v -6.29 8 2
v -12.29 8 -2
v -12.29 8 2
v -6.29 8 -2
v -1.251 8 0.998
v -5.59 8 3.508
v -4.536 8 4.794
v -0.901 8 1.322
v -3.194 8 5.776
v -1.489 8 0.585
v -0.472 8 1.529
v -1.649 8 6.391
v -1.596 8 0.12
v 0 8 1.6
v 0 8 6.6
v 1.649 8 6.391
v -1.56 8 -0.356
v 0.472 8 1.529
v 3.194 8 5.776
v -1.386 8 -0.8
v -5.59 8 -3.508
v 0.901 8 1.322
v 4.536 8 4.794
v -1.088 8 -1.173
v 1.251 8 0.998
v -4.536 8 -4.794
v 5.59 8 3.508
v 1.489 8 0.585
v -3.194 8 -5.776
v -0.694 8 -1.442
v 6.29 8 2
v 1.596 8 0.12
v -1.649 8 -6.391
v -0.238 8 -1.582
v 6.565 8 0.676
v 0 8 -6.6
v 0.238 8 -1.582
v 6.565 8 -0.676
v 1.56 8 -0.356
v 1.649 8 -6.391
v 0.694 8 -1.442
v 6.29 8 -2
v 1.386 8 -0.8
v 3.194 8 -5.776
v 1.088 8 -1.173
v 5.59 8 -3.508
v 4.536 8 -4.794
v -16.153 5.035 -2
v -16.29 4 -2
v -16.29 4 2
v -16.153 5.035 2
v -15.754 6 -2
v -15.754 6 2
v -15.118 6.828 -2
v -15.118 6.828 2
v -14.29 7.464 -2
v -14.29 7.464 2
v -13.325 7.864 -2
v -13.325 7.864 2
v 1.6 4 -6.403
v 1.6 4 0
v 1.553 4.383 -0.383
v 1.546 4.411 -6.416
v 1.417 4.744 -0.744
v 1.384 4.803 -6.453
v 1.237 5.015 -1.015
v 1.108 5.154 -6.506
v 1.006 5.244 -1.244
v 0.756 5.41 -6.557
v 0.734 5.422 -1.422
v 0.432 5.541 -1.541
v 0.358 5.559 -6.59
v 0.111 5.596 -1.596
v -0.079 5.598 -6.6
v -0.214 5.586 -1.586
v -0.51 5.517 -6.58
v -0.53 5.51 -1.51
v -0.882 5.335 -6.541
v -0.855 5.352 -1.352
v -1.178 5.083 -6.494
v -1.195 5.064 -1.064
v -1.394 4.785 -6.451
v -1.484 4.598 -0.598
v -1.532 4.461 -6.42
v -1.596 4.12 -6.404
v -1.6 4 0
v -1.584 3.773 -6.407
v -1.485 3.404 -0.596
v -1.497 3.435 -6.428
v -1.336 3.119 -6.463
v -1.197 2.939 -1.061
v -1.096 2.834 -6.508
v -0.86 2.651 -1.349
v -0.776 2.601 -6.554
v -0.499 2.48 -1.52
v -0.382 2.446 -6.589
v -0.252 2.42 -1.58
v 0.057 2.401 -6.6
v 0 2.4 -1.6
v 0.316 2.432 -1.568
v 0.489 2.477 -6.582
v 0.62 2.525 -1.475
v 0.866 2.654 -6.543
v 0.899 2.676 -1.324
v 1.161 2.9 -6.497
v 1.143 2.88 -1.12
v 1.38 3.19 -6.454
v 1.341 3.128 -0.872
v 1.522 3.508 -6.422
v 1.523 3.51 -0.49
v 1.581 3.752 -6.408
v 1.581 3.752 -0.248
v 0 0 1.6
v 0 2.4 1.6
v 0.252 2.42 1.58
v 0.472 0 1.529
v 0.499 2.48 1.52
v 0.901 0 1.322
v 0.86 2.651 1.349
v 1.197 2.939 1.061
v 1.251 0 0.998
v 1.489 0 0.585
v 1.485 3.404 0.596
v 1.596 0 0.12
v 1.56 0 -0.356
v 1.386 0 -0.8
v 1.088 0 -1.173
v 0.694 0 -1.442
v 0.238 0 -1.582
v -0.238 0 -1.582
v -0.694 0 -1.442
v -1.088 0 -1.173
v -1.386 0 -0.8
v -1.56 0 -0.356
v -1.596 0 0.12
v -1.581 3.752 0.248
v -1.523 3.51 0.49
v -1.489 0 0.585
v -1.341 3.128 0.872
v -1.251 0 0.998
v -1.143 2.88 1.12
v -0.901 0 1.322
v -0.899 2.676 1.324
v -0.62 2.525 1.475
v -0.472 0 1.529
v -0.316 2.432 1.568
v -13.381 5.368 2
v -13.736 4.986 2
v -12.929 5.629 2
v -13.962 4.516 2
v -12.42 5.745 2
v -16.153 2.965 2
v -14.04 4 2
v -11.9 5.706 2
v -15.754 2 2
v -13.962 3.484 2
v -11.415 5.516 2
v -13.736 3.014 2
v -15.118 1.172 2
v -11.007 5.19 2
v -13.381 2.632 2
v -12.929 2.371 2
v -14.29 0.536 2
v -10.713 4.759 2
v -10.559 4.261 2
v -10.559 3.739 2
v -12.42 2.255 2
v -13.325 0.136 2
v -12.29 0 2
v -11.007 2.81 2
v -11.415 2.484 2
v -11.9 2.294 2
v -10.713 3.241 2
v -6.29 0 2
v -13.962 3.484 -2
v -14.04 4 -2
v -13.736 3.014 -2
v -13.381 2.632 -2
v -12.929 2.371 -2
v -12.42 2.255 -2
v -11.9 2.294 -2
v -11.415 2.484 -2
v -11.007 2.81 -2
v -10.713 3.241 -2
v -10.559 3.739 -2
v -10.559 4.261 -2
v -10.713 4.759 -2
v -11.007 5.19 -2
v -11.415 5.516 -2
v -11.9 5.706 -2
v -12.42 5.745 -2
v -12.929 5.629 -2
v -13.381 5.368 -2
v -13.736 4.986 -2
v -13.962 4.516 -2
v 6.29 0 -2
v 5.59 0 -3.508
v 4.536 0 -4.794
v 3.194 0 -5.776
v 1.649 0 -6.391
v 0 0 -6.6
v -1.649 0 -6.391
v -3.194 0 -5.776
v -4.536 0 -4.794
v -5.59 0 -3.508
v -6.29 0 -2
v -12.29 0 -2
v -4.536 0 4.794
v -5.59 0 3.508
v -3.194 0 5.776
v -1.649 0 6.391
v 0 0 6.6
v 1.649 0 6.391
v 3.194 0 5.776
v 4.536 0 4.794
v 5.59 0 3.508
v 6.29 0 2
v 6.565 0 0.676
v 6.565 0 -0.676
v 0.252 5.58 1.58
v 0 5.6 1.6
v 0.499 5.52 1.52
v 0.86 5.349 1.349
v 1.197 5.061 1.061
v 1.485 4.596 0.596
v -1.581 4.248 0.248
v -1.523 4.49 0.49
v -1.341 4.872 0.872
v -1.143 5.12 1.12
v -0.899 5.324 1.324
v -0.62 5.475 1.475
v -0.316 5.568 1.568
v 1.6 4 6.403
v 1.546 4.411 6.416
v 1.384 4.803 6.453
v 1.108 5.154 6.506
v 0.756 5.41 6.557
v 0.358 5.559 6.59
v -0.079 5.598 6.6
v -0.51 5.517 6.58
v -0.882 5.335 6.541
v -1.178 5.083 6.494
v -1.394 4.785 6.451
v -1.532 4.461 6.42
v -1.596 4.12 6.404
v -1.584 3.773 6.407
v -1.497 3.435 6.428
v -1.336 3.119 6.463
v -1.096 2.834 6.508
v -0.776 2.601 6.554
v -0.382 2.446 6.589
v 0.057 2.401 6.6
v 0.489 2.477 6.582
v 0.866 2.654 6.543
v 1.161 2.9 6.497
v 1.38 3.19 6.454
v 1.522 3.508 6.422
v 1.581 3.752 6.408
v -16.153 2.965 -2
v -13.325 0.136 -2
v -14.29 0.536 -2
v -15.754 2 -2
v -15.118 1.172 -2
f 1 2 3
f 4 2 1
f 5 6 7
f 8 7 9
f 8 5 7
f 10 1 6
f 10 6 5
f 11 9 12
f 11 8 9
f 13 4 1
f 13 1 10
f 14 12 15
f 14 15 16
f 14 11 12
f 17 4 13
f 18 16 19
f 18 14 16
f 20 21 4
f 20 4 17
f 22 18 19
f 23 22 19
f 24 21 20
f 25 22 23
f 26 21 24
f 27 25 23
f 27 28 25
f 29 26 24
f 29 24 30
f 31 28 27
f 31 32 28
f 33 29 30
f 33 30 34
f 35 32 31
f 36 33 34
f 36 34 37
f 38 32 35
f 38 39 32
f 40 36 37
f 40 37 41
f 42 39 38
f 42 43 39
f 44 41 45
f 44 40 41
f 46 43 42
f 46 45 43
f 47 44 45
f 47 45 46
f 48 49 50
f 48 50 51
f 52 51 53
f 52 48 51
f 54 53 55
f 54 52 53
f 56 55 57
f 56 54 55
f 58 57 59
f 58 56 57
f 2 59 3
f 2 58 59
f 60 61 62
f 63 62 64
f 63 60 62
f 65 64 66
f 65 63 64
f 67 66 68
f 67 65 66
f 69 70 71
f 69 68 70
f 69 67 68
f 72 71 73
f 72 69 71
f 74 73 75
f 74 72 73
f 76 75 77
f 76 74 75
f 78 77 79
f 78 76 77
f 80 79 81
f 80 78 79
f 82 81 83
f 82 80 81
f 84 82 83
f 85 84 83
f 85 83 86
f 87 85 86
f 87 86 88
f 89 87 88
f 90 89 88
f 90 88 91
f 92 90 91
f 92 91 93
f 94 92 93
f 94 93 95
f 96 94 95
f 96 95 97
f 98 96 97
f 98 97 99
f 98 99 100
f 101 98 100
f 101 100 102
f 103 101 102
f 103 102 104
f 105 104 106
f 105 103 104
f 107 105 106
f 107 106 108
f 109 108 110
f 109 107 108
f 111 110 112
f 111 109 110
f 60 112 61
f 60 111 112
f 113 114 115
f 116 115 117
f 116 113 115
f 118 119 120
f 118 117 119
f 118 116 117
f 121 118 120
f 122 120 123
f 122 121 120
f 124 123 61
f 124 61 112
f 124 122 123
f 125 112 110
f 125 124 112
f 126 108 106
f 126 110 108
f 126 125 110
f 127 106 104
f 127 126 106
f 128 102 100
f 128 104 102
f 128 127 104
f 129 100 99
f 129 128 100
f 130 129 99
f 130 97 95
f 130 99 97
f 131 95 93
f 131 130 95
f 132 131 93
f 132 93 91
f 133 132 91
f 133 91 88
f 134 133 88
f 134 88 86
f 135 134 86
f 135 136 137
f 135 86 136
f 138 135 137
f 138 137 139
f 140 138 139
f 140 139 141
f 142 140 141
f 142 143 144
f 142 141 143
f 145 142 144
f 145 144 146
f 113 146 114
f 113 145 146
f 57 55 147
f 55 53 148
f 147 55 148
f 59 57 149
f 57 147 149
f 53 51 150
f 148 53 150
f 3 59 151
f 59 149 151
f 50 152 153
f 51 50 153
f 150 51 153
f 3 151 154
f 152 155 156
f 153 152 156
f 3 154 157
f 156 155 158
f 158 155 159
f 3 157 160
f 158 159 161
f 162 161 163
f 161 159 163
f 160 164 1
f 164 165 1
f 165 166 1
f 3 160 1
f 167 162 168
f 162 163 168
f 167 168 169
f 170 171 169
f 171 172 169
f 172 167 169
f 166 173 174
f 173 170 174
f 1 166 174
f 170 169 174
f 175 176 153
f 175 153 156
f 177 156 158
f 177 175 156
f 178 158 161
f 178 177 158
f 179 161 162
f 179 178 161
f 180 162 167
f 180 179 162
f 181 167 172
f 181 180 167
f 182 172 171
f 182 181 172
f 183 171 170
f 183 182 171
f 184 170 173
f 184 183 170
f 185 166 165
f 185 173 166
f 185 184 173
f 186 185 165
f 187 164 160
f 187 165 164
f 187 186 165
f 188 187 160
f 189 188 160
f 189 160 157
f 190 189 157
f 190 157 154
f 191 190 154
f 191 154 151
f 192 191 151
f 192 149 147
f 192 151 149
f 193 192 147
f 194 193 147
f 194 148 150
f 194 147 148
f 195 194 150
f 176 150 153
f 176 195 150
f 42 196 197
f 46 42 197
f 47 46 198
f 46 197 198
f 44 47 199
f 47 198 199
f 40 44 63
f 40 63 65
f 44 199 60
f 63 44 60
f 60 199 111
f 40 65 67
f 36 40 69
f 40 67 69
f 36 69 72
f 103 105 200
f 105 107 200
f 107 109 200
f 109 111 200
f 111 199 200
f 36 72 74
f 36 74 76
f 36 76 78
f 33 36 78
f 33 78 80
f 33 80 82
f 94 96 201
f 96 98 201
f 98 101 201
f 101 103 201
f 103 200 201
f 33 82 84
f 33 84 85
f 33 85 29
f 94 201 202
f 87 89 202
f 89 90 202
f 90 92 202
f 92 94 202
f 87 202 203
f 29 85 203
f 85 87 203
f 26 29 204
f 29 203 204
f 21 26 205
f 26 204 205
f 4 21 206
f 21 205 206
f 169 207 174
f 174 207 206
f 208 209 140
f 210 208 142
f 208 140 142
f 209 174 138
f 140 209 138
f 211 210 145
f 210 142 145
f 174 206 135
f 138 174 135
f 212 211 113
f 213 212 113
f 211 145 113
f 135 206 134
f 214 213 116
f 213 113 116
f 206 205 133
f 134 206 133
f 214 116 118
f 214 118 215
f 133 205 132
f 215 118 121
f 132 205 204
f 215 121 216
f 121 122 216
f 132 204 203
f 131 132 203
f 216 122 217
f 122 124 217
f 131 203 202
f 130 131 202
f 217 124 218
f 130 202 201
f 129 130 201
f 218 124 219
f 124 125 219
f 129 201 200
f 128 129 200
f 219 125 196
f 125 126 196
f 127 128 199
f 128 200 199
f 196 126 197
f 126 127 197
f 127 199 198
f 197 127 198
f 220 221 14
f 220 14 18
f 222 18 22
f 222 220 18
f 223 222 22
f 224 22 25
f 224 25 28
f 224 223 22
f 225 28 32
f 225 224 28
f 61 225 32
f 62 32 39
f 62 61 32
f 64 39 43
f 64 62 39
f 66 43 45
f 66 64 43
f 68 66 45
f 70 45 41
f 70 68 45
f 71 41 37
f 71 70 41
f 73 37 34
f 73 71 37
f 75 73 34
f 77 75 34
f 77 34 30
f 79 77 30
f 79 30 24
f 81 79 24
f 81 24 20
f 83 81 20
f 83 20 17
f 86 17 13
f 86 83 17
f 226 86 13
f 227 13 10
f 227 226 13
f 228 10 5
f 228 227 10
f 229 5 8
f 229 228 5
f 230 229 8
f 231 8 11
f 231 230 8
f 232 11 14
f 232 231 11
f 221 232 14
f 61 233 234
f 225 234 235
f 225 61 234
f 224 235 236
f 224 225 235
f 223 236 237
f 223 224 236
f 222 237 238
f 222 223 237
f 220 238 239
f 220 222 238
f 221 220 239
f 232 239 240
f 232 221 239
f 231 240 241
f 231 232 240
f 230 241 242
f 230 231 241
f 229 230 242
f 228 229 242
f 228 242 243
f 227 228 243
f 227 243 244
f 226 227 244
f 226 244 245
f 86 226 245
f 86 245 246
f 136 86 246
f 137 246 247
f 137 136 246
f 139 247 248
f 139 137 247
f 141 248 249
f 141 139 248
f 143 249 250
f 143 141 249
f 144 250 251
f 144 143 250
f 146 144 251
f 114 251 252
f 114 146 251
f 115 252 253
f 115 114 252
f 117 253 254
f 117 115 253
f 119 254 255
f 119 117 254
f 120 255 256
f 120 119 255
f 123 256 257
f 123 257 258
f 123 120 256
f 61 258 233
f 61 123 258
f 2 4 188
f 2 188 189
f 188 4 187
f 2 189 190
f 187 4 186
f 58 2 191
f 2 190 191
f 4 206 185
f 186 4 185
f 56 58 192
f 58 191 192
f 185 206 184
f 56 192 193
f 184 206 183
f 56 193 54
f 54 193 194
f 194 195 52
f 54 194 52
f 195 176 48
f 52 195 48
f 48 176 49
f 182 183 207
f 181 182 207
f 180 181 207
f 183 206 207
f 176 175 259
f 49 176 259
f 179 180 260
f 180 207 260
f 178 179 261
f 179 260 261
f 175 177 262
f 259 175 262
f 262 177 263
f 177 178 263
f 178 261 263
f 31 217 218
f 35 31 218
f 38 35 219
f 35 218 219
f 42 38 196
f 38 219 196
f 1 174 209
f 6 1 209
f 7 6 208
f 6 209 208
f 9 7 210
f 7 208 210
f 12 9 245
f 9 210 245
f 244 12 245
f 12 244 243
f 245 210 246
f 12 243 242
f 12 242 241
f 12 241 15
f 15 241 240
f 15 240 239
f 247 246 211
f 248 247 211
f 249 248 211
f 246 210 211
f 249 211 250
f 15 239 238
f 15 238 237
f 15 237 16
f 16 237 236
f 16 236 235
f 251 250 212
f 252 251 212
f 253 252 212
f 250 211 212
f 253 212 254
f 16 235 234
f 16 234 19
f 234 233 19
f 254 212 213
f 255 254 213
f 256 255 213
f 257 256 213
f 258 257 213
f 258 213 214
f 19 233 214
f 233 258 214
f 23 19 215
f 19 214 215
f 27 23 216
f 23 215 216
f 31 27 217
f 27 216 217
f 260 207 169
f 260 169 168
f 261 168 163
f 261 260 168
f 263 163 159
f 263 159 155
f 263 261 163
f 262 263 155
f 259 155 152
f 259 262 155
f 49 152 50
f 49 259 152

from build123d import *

# Parameters (mm, degrees)
SKETCH1_R               = 1.6
BOSS_EXTRUDE1_DEPTH     = 8
CUT_EXTRUDE1_DEPTH      = 21.082666196
CUT_EXTRUDE1_DEPTH_BACK = 21.082666196
SKETCH2_R               = 1.75
SKETCH2_R_2             = 1.6


with BuildPart() as part:
    # Sketch1 → Boss-Extrude1 (new body)
    with BuildSketch(Plane(origin=(0, 0, 0), x_dir=(1, 0, 0), z_dir=(0, 1, 0))):
        with BuildLine():
            Line((-6.289674077, 2), (-16.289674077, 2))
            Line((-16.289674077, 2), (-16.289674077, -2))
            Line((-16.289674077, -2), (-6.289674077, -2))
            ThreePointArc((-6.289674077, -2), (0, -6.6), (6.289674077, -2))
            ThreePointArc((6.289674077, -2), (6.6, 0), (6.289674077, 2))
            ThreePointArc((6.289674077, 2), (0, 6.6), (-6.289674077, 2))
        make_face()
        Circle(SKETCH1_R, mode=Mode.SUBTRACT)
    extrude(amount=BOSS_EXTRUDE1_DEPTH)

    # Sketch2 → Cut-Extrude1 (cut, two sides: drawn at the far end of the back side and taken through both)
    with BuildSketch(Plane.XY.offset(2).offset(-CUT_EXTRUDE1_DEPTH_BACK)):
        with BuildLine():
            Line((-16.289674077, 4), (-16.289674077, 0))
            Line((-16.289674077, 0), (-12.289674077, 0))
            ThreePointArc((-12.289674077, 0), (-15.118101202, 1.171572875), (-16.289674077, 4))
        make_face()
        with BuildLine():
            Line((-16.289674077, 8), (-16.289674077, 4))
            ThreePointArc((-16.289674077, 4), (-15.118101202, 6.828427125), (-12.289674077, 8))
            Line((-12.289674077, 8), (-16.289674077, 8))
        make_face()
        with Locations((-12.289674077, 4)):
            Circle(SKETCH2_R)
        with Locations((0, 4)):
            Circle(SKETCH2_R_2)
    extrude(amount=CUT_EXTRUDE1_DEPTH + CUT_EXTRUDE1_DEPTH_BACK, mode=Mode.SUBTRACT)


solid = part.part
